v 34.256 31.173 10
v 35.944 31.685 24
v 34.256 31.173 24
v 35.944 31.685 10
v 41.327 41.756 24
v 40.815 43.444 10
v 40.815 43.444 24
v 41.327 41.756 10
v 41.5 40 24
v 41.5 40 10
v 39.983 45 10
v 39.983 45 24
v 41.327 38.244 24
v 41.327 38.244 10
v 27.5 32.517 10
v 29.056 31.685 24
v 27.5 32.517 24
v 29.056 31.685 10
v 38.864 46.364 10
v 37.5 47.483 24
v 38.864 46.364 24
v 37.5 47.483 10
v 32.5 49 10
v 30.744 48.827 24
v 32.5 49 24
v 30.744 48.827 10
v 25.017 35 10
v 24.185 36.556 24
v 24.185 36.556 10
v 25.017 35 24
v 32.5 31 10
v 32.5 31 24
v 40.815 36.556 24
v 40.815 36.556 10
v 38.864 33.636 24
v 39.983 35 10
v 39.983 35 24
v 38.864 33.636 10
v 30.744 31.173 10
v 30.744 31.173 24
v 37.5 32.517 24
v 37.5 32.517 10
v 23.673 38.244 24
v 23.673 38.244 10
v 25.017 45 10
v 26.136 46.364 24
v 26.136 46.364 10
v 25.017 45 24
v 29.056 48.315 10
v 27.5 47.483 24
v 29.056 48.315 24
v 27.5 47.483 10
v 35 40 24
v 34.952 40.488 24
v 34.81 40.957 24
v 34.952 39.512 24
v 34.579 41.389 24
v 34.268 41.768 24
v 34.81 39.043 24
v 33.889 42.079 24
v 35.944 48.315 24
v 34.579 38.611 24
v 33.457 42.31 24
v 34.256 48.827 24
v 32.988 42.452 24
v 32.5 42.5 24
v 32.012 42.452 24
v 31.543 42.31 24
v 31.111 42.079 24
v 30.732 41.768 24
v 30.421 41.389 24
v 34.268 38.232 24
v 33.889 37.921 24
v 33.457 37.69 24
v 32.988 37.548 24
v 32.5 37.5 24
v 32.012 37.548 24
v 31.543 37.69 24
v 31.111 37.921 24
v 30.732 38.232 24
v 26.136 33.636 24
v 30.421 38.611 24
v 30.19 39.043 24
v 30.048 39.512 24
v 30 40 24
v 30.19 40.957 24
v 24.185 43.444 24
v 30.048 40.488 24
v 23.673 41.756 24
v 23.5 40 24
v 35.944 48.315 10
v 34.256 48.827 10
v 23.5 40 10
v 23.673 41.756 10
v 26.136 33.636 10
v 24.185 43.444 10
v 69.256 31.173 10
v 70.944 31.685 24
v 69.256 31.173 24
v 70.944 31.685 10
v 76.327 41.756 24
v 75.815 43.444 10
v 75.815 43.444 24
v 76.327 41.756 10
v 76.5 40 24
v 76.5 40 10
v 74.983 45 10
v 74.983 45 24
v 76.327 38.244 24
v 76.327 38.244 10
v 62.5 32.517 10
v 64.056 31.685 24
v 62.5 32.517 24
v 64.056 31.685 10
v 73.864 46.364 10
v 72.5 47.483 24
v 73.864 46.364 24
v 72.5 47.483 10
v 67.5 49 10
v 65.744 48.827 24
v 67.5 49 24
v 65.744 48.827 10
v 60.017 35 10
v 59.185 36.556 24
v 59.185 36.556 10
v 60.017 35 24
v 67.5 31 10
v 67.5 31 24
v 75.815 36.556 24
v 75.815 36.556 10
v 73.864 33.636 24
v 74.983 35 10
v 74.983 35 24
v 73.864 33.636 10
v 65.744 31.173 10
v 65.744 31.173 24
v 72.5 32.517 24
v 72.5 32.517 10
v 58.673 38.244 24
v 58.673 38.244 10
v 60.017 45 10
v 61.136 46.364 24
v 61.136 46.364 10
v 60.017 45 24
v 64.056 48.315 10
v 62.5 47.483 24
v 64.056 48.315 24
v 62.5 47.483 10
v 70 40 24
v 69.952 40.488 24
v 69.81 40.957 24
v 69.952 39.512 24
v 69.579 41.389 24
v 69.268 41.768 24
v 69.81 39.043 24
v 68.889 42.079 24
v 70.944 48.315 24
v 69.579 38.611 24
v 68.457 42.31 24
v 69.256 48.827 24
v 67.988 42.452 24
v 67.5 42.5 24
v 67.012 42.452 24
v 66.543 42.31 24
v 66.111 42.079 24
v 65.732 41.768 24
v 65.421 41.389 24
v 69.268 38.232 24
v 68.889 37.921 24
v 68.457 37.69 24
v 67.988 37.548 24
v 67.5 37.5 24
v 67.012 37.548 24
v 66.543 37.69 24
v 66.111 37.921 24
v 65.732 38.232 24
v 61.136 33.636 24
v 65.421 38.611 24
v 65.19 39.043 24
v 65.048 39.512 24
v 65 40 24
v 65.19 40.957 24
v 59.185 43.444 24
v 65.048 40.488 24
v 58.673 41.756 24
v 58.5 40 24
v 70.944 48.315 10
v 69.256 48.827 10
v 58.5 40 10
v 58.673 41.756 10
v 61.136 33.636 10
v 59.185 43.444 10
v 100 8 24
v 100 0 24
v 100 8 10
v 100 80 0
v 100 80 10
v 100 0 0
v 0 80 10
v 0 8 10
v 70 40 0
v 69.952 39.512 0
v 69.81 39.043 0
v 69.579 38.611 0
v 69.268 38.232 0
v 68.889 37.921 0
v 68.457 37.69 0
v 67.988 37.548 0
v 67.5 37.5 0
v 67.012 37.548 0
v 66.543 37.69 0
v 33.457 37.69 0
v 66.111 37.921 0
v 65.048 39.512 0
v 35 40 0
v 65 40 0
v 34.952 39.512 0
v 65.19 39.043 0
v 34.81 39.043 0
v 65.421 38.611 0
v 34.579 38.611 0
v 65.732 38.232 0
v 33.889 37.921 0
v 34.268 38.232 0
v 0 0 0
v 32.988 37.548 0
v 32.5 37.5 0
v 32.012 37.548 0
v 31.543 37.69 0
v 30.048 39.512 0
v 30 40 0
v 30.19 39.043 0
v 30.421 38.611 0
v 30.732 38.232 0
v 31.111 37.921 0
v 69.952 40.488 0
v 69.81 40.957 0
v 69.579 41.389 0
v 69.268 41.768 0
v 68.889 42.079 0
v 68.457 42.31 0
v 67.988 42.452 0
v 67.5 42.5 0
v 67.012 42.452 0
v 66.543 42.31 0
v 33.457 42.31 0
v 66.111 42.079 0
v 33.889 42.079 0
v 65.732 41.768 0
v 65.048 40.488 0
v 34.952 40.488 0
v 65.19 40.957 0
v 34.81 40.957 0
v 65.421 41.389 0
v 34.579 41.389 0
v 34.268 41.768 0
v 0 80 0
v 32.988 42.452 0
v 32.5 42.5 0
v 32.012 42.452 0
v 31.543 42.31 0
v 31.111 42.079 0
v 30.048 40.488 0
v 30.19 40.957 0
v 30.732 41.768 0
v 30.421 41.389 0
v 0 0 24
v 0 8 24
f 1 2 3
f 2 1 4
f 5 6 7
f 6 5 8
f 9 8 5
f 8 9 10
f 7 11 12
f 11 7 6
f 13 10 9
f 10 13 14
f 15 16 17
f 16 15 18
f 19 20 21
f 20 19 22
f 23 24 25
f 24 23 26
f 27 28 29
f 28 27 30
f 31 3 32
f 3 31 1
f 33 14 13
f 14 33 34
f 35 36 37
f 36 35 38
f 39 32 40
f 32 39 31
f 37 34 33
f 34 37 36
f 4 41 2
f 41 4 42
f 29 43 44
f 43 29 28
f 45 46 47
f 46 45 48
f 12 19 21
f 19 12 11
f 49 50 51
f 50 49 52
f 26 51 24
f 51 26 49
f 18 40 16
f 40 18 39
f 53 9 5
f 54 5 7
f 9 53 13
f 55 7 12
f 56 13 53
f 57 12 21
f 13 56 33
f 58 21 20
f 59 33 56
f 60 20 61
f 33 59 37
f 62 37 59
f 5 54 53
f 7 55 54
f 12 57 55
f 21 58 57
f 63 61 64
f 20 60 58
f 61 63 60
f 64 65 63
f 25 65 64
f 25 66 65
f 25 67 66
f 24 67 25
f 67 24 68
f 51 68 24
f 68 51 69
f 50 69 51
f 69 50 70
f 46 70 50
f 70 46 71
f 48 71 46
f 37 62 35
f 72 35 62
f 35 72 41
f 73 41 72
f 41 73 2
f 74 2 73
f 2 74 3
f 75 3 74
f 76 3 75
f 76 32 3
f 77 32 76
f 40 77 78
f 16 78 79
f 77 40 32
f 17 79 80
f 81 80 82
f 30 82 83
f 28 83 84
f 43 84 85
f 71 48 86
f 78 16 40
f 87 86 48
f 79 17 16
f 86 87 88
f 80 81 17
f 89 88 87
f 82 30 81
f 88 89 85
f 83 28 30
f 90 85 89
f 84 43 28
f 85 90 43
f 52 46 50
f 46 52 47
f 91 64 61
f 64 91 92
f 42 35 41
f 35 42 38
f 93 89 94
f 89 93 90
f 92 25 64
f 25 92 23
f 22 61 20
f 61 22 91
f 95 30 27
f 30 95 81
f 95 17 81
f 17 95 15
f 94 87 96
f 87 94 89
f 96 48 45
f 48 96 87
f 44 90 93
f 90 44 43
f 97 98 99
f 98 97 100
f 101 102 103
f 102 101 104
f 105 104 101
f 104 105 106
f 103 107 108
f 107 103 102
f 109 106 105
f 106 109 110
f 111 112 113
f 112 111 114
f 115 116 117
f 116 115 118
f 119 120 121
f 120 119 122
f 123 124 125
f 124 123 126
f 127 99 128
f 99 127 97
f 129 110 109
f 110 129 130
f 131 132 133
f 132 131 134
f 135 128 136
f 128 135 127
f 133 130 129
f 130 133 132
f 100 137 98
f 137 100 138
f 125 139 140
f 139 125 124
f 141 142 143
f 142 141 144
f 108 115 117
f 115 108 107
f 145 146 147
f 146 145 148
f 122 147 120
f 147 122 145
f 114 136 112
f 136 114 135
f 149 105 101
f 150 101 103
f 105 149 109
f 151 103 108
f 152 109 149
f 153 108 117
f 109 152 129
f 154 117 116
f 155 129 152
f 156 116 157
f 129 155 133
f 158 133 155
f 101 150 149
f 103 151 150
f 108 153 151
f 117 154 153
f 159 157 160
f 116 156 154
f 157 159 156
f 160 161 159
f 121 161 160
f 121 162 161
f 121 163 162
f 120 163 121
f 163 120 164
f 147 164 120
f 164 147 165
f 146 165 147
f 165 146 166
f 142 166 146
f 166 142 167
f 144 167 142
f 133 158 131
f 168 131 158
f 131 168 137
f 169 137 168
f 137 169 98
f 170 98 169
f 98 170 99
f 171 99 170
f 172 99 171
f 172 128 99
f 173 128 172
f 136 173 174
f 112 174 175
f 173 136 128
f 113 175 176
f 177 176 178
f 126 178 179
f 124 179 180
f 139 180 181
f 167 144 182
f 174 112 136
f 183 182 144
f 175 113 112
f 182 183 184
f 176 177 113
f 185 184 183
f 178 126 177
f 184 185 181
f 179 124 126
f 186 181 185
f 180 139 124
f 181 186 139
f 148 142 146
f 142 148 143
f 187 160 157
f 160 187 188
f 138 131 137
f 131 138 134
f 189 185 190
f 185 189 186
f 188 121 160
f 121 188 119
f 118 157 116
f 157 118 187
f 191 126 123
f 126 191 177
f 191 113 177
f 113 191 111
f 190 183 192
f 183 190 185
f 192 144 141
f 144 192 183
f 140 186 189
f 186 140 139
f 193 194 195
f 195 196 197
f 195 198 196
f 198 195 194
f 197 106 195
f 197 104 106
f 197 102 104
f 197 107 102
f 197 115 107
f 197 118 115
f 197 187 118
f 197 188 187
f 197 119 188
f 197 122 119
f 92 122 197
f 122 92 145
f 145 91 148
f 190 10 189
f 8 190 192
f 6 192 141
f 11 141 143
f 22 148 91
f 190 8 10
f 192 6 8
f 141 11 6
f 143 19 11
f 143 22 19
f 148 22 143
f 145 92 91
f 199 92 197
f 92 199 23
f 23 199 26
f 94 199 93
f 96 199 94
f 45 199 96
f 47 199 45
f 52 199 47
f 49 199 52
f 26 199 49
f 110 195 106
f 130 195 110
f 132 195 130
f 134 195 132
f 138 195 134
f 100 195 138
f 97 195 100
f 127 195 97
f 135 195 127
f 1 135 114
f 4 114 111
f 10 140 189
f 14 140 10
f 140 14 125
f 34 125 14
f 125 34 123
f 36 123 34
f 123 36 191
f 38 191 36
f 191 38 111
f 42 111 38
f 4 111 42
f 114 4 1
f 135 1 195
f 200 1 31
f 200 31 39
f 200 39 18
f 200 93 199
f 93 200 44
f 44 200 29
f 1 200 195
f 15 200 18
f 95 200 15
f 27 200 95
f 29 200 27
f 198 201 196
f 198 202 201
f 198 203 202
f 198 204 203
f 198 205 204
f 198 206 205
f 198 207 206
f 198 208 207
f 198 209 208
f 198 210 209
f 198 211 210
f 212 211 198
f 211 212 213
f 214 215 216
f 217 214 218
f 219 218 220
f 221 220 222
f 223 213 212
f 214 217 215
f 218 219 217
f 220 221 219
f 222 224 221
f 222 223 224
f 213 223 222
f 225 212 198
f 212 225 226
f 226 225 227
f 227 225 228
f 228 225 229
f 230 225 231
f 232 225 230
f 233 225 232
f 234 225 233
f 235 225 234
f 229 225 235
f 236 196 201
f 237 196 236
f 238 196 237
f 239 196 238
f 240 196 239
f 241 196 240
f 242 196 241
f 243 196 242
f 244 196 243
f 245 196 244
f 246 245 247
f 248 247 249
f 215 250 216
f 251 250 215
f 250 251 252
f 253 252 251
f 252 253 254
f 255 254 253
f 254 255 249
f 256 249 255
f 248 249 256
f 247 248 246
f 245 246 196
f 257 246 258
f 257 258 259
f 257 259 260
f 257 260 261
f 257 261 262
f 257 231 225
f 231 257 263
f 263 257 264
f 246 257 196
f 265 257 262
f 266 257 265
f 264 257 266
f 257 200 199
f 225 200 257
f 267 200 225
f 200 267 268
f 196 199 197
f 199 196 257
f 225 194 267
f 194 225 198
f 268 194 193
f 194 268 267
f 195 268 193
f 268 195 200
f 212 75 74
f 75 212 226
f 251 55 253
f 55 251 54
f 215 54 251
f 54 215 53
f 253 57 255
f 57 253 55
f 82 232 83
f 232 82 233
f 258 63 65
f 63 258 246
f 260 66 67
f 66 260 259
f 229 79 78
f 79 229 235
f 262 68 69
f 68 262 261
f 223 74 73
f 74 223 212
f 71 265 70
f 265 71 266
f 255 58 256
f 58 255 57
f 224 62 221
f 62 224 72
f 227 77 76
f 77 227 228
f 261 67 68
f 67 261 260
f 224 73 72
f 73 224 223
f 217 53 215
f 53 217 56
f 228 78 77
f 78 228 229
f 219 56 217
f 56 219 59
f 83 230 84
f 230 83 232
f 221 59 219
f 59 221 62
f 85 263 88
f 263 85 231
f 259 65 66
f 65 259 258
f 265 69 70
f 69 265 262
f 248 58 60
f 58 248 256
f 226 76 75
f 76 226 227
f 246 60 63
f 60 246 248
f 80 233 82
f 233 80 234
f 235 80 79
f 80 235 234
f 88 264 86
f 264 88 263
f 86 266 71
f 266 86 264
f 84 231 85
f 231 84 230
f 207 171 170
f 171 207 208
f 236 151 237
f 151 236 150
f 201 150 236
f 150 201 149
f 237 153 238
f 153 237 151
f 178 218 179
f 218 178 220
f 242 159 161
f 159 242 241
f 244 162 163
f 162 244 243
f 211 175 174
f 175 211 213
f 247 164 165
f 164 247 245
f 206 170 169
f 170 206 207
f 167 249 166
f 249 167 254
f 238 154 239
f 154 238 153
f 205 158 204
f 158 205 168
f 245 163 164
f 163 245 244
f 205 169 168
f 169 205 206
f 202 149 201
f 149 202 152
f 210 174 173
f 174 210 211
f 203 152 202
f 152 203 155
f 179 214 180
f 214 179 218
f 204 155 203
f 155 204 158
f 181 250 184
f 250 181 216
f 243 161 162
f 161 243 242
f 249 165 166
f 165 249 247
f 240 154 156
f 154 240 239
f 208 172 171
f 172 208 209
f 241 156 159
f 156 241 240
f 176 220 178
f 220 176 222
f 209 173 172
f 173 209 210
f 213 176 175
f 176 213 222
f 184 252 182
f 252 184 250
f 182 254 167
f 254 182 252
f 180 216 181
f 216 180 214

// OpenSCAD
$fn = 32;

// ----------------------------------------------------------------------
// Drill jig: fence jig
// ----------------------------------------------------------------------

// --- parameters (mm) ---
plate_l = 100;            // plate length, X
plate_w = 80;             // plate width, Y
plate_t = 10;             // plate thickness
boss_d = 18;              // guide boss diameter
boss_h = 15;              // boss height above the plate
guide_d = 5;              // guide hole diameter
boss_pitch = 35;          // boss pitch
fence_h = 15;             // fence height above the plate
fence_t = 8;              // fence thickness
fit_tol = 0.1;            // tolerance for press fits, mm
free_tol = 0.5;           // tolerance for clearance fits, mm

n_boss = 2;  // guide bosses
boss_x0 = (plate_l - (n_boss - 1) * boss_pitch) / 2;  // first boss X
boss_top = plate_t - 1 + boss_h;  // boss crown height
fence_top = plate_t - 1 + fence_h;  // fence crown height
total_h = max([fence_top, boss_top]);  // overall height

difference() {
  union() {
  cube([plate_l, plate_w, plate_t]);
  for (i = [0 : n_boss - 1])
    translate([boss_x0 + i * boss_pitch, plate_w / 2, plate_t - 1])
      cylinder(h = boss_h, d = boss_d);
  translate([0, 0, plate_t - 1]) cube([plate_l, fence_t, fence_h]);
  }
  for (i = [0 : n_boss - 1])
    translate([boss_x0 + i * boss_pitch, plate_w / 2, -1])
      cylinder(h = plate_t + boss_h, d = guide_d);
}
